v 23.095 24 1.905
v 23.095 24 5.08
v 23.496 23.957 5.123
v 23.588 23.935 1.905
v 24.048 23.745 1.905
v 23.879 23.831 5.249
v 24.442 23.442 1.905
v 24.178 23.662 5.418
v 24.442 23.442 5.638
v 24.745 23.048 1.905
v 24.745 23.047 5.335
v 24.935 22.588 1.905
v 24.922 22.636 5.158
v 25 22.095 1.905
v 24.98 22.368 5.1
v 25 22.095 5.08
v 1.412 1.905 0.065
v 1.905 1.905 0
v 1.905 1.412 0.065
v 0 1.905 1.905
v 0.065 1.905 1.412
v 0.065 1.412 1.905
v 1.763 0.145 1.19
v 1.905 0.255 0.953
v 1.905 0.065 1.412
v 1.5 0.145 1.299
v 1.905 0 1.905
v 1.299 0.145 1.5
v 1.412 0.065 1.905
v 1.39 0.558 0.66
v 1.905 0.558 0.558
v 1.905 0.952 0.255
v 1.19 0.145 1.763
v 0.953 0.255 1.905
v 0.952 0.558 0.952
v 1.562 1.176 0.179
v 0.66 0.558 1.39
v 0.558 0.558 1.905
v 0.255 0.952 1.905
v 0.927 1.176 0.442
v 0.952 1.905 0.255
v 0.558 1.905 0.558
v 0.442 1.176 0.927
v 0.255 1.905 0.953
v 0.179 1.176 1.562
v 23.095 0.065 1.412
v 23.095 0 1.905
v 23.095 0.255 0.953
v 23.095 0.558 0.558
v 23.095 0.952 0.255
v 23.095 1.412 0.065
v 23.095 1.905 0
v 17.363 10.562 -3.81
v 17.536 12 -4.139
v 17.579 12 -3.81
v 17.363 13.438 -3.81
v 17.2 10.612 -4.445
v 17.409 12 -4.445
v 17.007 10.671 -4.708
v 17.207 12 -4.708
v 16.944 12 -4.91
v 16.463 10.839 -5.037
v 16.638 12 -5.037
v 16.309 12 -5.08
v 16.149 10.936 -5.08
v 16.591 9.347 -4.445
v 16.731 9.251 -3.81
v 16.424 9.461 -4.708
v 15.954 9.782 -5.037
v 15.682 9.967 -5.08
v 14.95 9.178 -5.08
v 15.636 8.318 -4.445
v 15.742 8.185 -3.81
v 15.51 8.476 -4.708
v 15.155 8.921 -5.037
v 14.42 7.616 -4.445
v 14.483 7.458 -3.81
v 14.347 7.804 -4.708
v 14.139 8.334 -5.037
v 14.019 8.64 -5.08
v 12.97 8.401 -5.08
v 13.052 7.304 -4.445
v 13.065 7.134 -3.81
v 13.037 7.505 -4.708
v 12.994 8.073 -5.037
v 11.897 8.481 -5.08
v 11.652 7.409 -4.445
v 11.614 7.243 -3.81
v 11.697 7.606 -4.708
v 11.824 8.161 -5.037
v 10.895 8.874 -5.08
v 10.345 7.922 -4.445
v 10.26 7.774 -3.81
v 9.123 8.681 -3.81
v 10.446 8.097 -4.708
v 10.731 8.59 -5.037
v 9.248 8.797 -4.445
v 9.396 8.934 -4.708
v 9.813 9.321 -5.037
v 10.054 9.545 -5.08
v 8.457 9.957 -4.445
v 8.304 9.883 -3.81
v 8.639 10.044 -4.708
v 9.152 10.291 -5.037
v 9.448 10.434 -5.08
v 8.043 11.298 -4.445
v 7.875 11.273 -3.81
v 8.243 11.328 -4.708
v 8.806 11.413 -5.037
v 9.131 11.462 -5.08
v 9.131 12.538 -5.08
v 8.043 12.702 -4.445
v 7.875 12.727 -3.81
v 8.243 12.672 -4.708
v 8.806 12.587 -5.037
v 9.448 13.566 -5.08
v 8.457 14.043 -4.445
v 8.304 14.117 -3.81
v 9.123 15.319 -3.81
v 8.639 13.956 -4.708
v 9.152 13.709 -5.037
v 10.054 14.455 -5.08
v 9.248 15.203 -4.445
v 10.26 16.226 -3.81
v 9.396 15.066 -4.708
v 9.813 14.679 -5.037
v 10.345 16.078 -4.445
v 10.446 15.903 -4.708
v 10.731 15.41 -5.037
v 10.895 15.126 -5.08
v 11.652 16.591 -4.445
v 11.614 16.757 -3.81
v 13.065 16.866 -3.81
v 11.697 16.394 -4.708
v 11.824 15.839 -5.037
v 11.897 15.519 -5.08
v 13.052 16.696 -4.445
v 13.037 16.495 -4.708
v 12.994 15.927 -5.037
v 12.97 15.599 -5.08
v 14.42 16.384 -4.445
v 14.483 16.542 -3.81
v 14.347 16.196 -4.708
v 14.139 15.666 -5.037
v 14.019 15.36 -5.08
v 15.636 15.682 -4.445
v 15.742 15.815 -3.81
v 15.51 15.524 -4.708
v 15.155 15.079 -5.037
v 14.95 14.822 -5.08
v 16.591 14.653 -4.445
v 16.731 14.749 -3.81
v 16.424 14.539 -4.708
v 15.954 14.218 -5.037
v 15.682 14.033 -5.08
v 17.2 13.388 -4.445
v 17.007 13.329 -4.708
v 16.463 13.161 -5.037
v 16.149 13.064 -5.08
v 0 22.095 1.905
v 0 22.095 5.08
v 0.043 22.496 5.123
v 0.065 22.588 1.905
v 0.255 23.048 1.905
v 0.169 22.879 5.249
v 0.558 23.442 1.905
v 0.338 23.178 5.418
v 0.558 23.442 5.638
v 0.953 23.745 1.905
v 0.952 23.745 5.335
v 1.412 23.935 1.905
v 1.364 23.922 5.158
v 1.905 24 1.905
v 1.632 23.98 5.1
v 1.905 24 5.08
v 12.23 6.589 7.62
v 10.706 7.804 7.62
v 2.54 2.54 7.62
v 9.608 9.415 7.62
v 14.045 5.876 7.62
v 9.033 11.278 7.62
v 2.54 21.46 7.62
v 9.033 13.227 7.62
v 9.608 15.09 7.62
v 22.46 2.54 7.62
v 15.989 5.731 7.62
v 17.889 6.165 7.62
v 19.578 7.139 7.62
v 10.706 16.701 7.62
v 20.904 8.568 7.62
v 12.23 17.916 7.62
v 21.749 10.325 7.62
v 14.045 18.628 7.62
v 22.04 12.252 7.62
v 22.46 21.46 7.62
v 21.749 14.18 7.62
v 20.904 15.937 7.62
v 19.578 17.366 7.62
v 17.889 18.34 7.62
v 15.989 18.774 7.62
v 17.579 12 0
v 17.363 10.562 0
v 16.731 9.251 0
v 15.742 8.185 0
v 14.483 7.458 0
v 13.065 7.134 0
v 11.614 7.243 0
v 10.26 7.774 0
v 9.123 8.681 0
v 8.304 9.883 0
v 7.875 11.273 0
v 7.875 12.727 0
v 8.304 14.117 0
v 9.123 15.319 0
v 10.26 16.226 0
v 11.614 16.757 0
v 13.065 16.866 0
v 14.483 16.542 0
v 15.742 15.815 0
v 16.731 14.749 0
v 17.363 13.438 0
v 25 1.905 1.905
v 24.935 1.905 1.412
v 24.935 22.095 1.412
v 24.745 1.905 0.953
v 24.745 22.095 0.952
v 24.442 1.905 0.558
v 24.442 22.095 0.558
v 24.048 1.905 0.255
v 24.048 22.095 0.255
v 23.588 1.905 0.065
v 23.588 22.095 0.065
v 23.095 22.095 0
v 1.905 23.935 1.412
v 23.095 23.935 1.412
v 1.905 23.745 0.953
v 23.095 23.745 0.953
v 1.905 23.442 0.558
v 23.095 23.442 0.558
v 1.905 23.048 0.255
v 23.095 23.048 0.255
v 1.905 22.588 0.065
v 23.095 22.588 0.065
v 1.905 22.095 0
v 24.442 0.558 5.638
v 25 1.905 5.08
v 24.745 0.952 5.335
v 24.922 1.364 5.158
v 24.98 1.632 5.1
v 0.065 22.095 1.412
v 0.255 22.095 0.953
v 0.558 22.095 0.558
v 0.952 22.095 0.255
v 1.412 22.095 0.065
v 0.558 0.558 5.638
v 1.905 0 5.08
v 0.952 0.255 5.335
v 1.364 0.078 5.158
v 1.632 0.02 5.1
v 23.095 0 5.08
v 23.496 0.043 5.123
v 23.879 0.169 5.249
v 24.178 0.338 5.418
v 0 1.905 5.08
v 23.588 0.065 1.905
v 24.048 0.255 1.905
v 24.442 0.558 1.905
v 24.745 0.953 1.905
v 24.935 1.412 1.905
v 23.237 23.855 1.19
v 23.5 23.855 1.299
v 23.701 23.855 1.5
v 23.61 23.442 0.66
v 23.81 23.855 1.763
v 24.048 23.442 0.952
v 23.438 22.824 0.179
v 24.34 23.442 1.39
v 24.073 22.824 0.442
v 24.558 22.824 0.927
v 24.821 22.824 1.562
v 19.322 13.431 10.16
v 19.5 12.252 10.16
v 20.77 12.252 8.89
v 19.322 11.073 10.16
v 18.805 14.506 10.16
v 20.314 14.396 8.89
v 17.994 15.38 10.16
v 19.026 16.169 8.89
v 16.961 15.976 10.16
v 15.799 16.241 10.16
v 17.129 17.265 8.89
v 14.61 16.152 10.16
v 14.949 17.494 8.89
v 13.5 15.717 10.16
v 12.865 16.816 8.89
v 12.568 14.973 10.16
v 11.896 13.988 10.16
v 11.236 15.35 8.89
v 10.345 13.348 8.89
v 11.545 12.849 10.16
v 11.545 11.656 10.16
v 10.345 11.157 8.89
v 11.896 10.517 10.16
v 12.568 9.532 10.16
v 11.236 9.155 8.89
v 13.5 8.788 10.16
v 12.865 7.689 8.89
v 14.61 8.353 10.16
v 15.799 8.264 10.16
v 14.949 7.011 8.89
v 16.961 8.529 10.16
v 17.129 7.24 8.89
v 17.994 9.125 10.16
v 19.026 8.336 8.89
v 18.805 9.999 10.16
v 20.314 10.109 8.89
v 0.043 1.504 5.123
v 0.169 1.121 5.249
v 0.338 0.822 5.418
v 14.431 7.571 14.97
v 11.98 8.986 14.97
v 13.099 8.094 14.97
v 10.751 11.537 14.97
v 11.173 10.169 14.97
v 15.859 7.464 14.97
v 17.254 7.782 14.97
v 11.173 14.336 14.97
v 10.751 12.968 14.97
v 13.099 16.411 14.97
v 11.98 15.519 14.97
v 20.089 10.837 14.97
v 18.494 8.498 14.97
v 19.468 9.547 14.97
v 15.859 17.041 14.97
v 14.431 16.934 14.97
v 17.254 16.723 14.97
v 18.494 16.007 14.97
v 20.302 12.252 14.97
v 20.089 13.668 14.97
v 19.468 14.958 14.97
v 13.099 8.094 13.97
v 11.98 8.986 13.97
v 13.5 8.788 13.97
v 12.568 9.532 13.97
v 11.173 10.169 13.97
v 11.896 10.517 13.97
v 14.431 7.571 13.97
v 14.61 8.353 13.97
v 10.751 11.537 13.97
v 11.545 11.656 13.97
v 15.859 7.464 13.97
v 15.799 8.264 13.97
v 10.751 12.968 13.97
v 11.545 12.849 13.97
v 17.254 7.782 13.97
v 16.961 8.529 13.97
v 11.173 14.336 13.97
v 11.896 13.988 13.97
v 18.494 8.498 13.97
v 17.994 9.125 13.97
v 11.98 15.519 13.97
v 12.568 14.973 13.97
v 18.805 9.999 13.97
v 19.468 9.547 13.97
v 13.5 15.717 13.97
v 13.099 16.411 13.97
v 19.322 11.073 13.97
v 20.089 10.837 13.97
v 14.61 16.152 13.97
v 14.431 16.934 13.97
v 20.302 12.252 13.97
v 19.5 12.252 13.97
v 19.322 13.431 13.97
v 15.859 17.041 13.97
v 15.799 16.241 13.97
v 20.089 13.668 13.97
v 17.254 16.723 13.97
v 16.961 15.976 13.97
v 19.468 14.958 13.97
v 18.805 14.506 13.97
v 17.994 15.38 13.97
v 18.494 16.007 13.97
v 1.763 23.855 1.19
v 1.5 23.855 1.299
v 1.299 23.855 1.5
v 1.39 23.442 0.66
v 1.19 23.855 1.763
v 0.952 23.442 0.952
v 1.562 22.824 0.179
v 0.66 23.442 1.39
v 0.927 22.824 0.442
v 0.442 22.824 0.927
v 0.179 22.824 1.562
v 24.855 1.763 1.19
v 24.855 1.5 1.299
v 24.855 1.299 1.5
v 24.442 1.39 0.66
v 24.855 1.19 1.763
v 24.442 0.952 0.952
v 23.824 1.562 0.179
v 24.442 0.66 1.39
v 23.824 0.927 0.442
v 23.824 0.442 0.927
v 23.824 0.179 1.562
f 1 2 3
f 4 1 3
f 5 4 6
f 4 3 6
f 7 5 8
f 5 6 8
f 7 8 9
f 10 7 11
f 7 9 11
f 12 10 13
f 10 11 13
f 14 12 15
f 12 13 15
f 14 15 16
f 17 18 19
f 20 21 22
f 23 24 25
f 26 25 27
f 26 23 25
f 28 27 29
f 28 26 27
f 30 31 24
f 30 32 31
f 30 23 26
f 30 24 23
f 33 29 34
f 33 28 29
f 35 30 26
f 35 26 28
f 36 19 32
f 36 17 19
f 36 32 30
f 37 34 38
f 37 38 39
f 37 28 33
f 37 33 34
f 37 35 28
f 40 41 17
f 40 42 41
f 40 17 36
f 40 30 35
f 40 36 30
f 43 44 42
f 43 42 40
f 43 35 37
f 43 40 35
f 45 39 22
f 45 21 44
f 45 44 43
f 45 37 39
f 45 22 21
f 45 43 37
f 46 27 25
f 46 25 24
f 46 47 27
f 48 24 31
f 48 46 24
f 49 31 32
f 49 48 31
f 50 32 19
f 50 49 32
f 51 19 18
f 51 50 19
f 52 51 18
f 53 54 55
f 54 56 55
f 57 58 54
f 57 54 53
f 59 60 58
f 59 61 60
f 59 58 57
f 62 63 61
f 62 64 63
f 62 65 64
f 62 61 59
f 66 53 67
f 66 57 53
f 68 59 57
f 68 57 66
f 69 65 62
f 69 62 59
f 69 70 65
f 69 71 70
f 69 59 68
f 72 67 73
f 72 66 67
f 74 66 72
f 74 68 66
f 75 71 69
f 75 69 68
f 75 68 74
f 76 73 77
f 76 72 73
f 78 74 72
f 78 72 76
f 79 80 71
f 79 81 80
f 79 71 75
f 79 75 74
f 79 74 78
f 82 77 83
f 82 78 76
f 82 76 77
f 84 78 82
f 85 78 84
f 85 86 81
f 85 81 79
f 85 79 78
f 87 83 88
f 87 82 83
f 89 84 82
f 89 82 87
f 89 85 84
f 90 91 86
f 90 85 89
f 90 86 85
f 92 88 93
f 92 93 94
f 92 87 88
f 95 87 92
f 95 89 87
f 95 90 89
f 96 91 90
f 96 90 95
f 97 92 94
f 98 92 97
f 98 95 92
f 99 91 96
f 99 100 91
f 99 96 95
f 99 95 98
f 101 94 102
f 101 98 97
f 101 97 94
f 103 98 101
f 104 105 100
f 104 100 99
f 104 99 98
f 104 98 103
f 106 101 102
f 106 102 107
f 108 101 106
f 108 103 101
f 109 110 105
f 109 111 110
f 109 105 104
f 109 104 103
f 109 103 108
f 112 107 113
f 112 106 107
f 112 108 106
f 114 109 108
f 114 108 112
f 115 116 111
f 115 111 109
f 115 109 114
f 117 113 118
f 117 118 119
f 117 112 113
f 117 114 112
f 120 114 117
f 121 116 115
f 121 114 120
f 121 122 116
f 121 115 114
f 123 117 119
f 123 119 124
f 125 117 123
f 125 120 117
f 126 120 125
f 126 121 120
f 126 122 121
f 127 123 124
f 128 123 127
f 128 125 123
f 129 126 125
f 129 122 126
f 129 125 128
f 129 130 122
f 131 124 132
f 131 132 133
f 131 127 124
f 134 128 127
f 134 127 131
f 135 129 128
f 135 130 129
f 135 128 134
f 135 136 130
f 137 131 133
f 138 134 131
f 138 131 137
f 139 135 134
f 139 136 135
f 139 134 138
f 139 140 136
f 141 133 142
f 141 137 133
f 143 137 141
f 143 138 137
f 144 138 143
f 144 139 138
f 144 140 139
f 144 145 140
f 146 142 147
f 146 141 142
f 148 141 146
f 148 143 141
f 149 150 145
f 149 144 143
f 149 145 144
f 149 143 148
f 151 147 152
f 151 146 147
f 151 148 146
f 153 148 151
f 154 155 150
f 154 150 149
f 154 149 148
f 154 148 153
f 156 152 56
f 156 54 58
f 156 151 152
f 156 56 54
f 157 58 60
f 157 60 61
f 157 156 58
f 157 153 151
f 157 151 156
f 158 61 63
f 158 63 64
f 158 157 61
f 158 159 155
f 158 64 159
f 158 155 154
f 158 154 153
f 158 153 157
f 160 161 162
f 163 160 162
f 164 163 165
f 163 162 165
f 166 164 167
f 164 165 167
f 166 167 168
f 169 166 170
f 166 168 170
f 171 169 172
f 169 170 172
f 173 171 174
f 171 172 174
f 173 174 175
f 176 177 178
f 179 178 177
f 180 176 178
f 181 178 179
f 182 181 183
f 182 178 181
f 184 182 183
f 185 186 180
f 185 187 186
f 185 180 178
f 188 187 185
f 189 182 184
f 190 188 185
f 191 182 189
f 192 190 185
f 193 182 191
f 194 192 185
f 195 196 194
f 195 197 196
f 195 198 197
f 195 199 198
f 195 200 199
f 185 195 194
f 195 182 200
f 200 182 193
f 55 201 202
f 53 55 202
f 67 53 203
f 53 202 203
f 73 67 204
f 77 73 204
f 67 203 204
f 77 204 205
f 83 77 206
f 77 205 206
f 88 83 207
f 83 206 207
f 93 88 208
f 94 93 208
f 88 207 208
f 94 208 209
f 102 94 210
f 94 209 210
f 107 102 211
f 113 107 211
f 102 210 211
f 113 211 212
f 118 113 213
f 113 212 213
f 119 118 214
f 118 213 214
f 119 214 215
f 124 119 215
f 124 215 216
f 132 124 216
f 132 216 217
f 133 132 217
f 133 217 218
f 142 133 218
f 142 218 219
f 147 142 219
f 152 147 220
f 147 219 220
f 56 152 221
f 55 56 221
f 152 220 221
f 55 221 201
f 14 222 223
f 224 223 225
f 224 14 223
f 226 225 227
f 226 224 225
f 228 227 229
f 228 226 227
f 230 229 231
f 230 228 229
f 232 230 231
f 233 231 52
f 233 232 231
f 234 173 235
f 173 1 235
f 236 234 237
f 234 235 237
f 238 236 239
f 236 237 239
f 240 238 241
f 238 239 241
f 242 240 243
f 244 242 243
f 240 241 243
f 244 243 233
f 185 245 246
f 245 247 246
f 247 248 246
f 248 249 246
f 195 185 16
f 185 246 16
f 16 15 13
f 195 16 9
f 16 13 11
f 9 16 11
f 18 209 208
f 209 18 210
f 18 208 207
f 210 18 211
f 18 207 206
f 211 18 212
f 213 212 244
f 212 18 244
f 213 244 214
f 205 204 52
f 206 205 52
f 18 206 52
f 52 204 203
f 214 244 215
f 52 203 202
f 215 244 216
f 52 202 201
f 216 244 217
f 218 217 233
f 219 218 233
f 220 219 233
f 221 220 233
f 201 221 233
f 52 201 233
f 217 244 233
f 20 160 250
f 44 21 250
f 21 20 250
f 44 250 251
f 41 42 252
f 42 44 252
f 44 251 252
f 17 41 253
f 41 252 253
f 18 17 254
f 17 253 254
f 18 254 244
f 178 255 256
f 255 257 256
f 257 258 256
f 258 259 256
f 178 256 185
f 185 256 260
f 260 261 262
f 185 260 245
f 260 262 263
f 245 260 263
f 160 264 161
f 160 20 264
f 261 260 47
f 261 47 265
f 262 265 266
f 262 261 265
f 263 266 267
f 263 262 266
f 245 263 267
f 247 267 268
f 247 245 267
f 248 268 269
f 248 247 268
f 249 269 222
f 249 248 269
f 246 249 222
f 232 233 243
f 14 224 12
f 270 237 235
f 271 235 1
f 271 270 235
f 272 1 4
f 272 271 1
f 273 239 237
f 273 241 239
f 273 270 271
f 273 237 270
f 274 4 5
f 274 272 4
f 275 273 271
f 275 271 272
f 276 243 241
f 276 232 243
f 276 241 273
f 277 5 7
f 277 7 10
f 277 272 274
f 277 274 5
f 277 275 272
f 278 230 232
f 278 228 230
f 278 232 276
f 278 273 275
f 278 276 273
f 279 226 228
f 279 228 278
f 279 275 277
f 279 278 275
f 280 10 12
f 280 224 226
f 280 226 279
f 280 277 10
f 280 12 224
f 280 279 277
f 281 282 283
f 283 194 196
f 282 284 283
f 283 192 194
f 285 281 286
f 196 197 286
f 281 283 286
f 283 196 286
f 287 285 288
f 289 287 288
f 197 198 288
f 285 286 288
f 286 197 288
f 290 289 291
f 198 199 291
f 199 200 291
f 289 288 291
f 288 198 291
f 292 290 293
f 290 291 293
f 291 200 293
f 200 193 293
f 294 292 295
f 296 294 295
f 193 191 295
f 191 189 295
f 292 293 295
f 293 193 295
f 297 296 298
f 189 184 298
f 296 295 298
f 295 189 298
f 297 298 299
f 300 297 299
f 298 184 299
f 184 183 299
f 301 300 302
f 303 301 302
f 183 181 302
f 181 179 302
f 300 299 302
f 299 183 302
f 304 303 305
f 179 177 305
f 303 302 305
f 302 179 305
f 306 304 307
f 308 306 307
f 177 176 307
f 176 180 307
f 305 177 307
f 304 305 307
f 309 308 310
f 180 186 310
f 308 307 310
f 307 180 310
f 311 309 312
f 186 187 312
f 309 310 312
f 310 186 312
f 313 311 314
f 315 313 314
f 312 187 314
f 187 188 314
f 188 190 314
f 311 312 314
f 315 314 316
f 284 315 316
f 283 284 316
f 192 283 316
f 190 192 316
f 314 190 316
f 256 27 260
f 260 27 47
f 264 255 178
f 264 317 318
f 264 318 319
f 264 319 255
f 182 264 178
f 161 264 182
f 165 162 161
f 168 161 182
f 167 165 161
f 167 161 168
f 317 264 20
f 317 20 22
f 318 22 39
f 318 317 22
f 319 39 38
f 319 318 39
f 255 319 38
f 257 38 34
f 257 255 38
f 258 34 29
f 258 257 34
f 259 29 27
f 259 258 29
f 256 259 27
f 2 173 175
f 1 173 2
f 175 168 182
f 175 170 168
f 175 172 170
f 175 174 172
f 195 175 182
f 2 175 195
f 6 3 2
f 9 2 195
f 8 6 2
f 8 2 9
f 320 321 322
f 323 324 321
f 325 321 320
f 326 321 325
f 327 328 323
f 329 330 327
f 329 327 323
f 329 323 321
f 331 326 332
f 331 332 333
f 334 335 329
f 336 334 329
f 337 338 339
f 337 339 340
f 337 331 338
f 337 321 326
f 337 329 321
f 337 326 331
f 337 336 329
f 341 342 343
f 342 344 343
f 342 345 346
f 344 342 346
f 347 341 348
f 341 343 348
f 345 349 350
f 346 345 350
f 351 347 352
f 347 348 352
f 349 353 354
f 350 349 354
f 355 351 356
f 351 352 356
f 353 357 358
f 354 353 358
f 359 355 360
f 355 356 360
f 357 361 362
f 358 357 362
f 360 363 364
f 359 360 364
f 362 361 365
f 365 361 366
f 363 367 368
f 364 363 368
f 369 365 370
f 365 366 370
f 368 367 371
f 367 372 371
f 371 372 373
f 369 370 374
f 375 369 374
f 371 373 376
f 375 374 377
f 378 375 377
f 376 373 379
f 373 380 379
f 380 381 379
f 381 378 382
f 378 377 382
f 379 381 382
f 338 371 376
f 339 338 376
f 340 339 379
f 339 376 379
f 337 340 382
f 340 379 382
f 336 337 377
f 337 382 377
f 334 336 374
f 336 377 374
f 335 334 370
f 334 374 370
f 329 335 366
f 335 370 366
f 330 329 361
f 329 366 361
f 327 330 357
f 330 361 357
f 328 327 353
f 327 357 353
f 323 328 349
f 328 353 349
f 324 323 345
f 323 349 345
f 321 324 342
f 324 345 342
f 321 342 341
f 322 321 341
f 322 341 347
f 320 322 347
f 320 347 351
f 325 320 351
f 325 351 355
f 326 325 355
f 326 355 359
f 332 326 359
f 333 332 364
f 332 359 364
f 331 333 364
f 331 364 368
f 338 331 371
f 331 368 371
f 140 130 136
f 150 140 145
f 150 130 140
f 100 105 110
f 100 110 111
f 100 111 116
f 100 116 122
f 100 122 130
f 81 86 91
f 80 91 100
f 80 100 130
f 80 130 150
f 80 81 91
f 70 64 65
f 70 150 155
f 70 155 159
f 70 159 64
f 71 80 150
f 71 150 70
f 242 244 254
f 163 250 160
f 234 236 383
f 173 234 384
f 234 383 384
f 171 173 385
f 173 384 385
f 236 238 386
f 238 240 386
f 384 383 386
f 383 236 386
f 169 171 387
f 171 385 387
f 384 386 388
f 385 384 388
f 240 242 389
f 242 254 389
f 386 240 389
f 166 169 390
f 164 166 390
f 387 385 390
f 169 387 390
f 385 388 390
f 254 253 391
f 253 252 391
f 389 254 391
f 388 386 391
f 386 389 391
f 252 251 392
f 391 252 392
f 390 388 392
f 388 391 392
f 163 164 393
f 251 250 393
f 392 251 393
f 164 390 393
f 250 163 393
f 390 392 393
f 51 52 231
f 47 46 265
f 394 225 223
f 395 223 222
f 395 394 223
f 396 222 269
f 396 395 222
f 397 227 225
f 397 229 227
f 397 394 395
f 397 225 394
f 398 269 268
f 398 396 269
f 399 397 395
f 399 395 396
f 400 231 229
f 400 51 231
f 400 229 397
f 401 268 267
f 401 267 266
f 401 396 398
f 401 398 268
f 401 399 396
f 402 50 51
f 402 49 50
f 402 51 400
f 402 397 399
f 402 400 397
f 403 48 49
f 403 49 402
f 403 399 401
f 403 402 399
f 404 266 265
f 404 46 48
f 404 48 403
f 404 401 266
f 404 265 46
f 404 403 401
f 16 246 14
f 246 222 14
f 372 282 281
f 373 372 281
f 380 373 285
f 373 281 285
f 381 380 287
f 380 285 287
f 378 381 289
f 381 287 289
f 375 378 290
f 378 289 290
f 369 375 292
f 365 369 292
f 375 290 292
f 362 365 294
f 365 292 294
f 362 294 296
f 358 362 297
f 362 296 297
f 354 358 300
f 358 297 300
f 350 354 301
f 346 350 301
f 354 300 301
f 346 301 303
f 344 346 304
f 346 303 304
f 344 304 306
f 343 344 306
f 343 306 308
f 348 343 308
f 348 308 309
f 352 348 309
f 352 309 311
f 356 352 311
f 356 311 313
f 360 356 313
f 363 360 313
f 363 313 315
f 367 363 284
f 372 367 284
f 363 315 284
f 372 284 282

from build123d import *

# Parameters (mm, degrees)
F0_W     = 25
F0_H     = 24
F1_DEPTH = 7.62
F2_R     = 4
F3_DEPTH = 6.35
F4_R     = 4.8022038817
F4_R_2   = 4
F5_DEPTH = 1
F6_SIZE  = 2.54
F7_R     = 1.905
F8_R     = 4.8792946489
F9_DEPTH = 5.08
F10_R    = 1.27


with BuildPart() as f1:
    # F0 (on Top) → F1 (new body)
    with BuildSketch(Plane.XY):
        with Locations((12.5, 12)):
            Rectangle(F0_W, F0_H)
    extrude(amount=F1_DEPTH)

    # F2 (on face) → F3 (join)
    with BuildSketch(Plane.XY.offset(7.62)):
        with Locations((15.5, 12.2524611652)):
            Circle(F2_R)
    extrude(amount=F3_DEPTH)

    # F4 (on face) → F5 (join)
    with BuildSketch(Plane.XY.offset(13.97)):
        with Locations((15.5, 12.2524611652)):
            Circle(F4_R)
        with Locations((15.5, 12.2524611652)):
            Circle(F4_R_2, mode=Mode.SUBTRACT)
        with Locations((15.5, 12.2524611652)):
            Circle(F4_R_2)
    extrude(amount=F5_DEPTH)

    # F6
    f6_edges = [f1.edges().sort_by_distance(p)[0] for p in [
        (0, 12, 7.62),
        (12.5, 24, 7.62),
        (12.5, 0, 7.62),
        (25, 12, 7.62),
        (11.5, 12.252461, 7.62),
    ]]
    chamfer(f6_edges, length=F6_SIZE)

    # F7
    f7_edges = [f1.edges().sort_by_distance(p)[0] for p in [
        (0, 12, 0),
        (12.5, 0, 0),
        (25, 12, 0),
        (12.5, 24, 0),
        (25, 24, 2.54),
        (25, 0, 2.54),
        (0, 0, 2.54),
        (0, 24, 2.54),
    ]]
    fillet(f7_edges, radius=F7_R)

    # F8 (on face) → F9 (join)
    with BuildSketch(Plane(origin=(0, 0, 0), x_dir=(1, 0, 0), z_dir=(0, 0, -1))):
        with Locations((12.7, -12)):
            Circle(F8_R)
    extrude(amount=F9_DEPTH)

    # F10
    f10_edges = [f1.edges().sort_by_distance(p)[0] for p in [
        (7.820705, 12, -5.08),
    ]]
    fillet(f10_edges, radius=F10_R)


solid = f1.part
